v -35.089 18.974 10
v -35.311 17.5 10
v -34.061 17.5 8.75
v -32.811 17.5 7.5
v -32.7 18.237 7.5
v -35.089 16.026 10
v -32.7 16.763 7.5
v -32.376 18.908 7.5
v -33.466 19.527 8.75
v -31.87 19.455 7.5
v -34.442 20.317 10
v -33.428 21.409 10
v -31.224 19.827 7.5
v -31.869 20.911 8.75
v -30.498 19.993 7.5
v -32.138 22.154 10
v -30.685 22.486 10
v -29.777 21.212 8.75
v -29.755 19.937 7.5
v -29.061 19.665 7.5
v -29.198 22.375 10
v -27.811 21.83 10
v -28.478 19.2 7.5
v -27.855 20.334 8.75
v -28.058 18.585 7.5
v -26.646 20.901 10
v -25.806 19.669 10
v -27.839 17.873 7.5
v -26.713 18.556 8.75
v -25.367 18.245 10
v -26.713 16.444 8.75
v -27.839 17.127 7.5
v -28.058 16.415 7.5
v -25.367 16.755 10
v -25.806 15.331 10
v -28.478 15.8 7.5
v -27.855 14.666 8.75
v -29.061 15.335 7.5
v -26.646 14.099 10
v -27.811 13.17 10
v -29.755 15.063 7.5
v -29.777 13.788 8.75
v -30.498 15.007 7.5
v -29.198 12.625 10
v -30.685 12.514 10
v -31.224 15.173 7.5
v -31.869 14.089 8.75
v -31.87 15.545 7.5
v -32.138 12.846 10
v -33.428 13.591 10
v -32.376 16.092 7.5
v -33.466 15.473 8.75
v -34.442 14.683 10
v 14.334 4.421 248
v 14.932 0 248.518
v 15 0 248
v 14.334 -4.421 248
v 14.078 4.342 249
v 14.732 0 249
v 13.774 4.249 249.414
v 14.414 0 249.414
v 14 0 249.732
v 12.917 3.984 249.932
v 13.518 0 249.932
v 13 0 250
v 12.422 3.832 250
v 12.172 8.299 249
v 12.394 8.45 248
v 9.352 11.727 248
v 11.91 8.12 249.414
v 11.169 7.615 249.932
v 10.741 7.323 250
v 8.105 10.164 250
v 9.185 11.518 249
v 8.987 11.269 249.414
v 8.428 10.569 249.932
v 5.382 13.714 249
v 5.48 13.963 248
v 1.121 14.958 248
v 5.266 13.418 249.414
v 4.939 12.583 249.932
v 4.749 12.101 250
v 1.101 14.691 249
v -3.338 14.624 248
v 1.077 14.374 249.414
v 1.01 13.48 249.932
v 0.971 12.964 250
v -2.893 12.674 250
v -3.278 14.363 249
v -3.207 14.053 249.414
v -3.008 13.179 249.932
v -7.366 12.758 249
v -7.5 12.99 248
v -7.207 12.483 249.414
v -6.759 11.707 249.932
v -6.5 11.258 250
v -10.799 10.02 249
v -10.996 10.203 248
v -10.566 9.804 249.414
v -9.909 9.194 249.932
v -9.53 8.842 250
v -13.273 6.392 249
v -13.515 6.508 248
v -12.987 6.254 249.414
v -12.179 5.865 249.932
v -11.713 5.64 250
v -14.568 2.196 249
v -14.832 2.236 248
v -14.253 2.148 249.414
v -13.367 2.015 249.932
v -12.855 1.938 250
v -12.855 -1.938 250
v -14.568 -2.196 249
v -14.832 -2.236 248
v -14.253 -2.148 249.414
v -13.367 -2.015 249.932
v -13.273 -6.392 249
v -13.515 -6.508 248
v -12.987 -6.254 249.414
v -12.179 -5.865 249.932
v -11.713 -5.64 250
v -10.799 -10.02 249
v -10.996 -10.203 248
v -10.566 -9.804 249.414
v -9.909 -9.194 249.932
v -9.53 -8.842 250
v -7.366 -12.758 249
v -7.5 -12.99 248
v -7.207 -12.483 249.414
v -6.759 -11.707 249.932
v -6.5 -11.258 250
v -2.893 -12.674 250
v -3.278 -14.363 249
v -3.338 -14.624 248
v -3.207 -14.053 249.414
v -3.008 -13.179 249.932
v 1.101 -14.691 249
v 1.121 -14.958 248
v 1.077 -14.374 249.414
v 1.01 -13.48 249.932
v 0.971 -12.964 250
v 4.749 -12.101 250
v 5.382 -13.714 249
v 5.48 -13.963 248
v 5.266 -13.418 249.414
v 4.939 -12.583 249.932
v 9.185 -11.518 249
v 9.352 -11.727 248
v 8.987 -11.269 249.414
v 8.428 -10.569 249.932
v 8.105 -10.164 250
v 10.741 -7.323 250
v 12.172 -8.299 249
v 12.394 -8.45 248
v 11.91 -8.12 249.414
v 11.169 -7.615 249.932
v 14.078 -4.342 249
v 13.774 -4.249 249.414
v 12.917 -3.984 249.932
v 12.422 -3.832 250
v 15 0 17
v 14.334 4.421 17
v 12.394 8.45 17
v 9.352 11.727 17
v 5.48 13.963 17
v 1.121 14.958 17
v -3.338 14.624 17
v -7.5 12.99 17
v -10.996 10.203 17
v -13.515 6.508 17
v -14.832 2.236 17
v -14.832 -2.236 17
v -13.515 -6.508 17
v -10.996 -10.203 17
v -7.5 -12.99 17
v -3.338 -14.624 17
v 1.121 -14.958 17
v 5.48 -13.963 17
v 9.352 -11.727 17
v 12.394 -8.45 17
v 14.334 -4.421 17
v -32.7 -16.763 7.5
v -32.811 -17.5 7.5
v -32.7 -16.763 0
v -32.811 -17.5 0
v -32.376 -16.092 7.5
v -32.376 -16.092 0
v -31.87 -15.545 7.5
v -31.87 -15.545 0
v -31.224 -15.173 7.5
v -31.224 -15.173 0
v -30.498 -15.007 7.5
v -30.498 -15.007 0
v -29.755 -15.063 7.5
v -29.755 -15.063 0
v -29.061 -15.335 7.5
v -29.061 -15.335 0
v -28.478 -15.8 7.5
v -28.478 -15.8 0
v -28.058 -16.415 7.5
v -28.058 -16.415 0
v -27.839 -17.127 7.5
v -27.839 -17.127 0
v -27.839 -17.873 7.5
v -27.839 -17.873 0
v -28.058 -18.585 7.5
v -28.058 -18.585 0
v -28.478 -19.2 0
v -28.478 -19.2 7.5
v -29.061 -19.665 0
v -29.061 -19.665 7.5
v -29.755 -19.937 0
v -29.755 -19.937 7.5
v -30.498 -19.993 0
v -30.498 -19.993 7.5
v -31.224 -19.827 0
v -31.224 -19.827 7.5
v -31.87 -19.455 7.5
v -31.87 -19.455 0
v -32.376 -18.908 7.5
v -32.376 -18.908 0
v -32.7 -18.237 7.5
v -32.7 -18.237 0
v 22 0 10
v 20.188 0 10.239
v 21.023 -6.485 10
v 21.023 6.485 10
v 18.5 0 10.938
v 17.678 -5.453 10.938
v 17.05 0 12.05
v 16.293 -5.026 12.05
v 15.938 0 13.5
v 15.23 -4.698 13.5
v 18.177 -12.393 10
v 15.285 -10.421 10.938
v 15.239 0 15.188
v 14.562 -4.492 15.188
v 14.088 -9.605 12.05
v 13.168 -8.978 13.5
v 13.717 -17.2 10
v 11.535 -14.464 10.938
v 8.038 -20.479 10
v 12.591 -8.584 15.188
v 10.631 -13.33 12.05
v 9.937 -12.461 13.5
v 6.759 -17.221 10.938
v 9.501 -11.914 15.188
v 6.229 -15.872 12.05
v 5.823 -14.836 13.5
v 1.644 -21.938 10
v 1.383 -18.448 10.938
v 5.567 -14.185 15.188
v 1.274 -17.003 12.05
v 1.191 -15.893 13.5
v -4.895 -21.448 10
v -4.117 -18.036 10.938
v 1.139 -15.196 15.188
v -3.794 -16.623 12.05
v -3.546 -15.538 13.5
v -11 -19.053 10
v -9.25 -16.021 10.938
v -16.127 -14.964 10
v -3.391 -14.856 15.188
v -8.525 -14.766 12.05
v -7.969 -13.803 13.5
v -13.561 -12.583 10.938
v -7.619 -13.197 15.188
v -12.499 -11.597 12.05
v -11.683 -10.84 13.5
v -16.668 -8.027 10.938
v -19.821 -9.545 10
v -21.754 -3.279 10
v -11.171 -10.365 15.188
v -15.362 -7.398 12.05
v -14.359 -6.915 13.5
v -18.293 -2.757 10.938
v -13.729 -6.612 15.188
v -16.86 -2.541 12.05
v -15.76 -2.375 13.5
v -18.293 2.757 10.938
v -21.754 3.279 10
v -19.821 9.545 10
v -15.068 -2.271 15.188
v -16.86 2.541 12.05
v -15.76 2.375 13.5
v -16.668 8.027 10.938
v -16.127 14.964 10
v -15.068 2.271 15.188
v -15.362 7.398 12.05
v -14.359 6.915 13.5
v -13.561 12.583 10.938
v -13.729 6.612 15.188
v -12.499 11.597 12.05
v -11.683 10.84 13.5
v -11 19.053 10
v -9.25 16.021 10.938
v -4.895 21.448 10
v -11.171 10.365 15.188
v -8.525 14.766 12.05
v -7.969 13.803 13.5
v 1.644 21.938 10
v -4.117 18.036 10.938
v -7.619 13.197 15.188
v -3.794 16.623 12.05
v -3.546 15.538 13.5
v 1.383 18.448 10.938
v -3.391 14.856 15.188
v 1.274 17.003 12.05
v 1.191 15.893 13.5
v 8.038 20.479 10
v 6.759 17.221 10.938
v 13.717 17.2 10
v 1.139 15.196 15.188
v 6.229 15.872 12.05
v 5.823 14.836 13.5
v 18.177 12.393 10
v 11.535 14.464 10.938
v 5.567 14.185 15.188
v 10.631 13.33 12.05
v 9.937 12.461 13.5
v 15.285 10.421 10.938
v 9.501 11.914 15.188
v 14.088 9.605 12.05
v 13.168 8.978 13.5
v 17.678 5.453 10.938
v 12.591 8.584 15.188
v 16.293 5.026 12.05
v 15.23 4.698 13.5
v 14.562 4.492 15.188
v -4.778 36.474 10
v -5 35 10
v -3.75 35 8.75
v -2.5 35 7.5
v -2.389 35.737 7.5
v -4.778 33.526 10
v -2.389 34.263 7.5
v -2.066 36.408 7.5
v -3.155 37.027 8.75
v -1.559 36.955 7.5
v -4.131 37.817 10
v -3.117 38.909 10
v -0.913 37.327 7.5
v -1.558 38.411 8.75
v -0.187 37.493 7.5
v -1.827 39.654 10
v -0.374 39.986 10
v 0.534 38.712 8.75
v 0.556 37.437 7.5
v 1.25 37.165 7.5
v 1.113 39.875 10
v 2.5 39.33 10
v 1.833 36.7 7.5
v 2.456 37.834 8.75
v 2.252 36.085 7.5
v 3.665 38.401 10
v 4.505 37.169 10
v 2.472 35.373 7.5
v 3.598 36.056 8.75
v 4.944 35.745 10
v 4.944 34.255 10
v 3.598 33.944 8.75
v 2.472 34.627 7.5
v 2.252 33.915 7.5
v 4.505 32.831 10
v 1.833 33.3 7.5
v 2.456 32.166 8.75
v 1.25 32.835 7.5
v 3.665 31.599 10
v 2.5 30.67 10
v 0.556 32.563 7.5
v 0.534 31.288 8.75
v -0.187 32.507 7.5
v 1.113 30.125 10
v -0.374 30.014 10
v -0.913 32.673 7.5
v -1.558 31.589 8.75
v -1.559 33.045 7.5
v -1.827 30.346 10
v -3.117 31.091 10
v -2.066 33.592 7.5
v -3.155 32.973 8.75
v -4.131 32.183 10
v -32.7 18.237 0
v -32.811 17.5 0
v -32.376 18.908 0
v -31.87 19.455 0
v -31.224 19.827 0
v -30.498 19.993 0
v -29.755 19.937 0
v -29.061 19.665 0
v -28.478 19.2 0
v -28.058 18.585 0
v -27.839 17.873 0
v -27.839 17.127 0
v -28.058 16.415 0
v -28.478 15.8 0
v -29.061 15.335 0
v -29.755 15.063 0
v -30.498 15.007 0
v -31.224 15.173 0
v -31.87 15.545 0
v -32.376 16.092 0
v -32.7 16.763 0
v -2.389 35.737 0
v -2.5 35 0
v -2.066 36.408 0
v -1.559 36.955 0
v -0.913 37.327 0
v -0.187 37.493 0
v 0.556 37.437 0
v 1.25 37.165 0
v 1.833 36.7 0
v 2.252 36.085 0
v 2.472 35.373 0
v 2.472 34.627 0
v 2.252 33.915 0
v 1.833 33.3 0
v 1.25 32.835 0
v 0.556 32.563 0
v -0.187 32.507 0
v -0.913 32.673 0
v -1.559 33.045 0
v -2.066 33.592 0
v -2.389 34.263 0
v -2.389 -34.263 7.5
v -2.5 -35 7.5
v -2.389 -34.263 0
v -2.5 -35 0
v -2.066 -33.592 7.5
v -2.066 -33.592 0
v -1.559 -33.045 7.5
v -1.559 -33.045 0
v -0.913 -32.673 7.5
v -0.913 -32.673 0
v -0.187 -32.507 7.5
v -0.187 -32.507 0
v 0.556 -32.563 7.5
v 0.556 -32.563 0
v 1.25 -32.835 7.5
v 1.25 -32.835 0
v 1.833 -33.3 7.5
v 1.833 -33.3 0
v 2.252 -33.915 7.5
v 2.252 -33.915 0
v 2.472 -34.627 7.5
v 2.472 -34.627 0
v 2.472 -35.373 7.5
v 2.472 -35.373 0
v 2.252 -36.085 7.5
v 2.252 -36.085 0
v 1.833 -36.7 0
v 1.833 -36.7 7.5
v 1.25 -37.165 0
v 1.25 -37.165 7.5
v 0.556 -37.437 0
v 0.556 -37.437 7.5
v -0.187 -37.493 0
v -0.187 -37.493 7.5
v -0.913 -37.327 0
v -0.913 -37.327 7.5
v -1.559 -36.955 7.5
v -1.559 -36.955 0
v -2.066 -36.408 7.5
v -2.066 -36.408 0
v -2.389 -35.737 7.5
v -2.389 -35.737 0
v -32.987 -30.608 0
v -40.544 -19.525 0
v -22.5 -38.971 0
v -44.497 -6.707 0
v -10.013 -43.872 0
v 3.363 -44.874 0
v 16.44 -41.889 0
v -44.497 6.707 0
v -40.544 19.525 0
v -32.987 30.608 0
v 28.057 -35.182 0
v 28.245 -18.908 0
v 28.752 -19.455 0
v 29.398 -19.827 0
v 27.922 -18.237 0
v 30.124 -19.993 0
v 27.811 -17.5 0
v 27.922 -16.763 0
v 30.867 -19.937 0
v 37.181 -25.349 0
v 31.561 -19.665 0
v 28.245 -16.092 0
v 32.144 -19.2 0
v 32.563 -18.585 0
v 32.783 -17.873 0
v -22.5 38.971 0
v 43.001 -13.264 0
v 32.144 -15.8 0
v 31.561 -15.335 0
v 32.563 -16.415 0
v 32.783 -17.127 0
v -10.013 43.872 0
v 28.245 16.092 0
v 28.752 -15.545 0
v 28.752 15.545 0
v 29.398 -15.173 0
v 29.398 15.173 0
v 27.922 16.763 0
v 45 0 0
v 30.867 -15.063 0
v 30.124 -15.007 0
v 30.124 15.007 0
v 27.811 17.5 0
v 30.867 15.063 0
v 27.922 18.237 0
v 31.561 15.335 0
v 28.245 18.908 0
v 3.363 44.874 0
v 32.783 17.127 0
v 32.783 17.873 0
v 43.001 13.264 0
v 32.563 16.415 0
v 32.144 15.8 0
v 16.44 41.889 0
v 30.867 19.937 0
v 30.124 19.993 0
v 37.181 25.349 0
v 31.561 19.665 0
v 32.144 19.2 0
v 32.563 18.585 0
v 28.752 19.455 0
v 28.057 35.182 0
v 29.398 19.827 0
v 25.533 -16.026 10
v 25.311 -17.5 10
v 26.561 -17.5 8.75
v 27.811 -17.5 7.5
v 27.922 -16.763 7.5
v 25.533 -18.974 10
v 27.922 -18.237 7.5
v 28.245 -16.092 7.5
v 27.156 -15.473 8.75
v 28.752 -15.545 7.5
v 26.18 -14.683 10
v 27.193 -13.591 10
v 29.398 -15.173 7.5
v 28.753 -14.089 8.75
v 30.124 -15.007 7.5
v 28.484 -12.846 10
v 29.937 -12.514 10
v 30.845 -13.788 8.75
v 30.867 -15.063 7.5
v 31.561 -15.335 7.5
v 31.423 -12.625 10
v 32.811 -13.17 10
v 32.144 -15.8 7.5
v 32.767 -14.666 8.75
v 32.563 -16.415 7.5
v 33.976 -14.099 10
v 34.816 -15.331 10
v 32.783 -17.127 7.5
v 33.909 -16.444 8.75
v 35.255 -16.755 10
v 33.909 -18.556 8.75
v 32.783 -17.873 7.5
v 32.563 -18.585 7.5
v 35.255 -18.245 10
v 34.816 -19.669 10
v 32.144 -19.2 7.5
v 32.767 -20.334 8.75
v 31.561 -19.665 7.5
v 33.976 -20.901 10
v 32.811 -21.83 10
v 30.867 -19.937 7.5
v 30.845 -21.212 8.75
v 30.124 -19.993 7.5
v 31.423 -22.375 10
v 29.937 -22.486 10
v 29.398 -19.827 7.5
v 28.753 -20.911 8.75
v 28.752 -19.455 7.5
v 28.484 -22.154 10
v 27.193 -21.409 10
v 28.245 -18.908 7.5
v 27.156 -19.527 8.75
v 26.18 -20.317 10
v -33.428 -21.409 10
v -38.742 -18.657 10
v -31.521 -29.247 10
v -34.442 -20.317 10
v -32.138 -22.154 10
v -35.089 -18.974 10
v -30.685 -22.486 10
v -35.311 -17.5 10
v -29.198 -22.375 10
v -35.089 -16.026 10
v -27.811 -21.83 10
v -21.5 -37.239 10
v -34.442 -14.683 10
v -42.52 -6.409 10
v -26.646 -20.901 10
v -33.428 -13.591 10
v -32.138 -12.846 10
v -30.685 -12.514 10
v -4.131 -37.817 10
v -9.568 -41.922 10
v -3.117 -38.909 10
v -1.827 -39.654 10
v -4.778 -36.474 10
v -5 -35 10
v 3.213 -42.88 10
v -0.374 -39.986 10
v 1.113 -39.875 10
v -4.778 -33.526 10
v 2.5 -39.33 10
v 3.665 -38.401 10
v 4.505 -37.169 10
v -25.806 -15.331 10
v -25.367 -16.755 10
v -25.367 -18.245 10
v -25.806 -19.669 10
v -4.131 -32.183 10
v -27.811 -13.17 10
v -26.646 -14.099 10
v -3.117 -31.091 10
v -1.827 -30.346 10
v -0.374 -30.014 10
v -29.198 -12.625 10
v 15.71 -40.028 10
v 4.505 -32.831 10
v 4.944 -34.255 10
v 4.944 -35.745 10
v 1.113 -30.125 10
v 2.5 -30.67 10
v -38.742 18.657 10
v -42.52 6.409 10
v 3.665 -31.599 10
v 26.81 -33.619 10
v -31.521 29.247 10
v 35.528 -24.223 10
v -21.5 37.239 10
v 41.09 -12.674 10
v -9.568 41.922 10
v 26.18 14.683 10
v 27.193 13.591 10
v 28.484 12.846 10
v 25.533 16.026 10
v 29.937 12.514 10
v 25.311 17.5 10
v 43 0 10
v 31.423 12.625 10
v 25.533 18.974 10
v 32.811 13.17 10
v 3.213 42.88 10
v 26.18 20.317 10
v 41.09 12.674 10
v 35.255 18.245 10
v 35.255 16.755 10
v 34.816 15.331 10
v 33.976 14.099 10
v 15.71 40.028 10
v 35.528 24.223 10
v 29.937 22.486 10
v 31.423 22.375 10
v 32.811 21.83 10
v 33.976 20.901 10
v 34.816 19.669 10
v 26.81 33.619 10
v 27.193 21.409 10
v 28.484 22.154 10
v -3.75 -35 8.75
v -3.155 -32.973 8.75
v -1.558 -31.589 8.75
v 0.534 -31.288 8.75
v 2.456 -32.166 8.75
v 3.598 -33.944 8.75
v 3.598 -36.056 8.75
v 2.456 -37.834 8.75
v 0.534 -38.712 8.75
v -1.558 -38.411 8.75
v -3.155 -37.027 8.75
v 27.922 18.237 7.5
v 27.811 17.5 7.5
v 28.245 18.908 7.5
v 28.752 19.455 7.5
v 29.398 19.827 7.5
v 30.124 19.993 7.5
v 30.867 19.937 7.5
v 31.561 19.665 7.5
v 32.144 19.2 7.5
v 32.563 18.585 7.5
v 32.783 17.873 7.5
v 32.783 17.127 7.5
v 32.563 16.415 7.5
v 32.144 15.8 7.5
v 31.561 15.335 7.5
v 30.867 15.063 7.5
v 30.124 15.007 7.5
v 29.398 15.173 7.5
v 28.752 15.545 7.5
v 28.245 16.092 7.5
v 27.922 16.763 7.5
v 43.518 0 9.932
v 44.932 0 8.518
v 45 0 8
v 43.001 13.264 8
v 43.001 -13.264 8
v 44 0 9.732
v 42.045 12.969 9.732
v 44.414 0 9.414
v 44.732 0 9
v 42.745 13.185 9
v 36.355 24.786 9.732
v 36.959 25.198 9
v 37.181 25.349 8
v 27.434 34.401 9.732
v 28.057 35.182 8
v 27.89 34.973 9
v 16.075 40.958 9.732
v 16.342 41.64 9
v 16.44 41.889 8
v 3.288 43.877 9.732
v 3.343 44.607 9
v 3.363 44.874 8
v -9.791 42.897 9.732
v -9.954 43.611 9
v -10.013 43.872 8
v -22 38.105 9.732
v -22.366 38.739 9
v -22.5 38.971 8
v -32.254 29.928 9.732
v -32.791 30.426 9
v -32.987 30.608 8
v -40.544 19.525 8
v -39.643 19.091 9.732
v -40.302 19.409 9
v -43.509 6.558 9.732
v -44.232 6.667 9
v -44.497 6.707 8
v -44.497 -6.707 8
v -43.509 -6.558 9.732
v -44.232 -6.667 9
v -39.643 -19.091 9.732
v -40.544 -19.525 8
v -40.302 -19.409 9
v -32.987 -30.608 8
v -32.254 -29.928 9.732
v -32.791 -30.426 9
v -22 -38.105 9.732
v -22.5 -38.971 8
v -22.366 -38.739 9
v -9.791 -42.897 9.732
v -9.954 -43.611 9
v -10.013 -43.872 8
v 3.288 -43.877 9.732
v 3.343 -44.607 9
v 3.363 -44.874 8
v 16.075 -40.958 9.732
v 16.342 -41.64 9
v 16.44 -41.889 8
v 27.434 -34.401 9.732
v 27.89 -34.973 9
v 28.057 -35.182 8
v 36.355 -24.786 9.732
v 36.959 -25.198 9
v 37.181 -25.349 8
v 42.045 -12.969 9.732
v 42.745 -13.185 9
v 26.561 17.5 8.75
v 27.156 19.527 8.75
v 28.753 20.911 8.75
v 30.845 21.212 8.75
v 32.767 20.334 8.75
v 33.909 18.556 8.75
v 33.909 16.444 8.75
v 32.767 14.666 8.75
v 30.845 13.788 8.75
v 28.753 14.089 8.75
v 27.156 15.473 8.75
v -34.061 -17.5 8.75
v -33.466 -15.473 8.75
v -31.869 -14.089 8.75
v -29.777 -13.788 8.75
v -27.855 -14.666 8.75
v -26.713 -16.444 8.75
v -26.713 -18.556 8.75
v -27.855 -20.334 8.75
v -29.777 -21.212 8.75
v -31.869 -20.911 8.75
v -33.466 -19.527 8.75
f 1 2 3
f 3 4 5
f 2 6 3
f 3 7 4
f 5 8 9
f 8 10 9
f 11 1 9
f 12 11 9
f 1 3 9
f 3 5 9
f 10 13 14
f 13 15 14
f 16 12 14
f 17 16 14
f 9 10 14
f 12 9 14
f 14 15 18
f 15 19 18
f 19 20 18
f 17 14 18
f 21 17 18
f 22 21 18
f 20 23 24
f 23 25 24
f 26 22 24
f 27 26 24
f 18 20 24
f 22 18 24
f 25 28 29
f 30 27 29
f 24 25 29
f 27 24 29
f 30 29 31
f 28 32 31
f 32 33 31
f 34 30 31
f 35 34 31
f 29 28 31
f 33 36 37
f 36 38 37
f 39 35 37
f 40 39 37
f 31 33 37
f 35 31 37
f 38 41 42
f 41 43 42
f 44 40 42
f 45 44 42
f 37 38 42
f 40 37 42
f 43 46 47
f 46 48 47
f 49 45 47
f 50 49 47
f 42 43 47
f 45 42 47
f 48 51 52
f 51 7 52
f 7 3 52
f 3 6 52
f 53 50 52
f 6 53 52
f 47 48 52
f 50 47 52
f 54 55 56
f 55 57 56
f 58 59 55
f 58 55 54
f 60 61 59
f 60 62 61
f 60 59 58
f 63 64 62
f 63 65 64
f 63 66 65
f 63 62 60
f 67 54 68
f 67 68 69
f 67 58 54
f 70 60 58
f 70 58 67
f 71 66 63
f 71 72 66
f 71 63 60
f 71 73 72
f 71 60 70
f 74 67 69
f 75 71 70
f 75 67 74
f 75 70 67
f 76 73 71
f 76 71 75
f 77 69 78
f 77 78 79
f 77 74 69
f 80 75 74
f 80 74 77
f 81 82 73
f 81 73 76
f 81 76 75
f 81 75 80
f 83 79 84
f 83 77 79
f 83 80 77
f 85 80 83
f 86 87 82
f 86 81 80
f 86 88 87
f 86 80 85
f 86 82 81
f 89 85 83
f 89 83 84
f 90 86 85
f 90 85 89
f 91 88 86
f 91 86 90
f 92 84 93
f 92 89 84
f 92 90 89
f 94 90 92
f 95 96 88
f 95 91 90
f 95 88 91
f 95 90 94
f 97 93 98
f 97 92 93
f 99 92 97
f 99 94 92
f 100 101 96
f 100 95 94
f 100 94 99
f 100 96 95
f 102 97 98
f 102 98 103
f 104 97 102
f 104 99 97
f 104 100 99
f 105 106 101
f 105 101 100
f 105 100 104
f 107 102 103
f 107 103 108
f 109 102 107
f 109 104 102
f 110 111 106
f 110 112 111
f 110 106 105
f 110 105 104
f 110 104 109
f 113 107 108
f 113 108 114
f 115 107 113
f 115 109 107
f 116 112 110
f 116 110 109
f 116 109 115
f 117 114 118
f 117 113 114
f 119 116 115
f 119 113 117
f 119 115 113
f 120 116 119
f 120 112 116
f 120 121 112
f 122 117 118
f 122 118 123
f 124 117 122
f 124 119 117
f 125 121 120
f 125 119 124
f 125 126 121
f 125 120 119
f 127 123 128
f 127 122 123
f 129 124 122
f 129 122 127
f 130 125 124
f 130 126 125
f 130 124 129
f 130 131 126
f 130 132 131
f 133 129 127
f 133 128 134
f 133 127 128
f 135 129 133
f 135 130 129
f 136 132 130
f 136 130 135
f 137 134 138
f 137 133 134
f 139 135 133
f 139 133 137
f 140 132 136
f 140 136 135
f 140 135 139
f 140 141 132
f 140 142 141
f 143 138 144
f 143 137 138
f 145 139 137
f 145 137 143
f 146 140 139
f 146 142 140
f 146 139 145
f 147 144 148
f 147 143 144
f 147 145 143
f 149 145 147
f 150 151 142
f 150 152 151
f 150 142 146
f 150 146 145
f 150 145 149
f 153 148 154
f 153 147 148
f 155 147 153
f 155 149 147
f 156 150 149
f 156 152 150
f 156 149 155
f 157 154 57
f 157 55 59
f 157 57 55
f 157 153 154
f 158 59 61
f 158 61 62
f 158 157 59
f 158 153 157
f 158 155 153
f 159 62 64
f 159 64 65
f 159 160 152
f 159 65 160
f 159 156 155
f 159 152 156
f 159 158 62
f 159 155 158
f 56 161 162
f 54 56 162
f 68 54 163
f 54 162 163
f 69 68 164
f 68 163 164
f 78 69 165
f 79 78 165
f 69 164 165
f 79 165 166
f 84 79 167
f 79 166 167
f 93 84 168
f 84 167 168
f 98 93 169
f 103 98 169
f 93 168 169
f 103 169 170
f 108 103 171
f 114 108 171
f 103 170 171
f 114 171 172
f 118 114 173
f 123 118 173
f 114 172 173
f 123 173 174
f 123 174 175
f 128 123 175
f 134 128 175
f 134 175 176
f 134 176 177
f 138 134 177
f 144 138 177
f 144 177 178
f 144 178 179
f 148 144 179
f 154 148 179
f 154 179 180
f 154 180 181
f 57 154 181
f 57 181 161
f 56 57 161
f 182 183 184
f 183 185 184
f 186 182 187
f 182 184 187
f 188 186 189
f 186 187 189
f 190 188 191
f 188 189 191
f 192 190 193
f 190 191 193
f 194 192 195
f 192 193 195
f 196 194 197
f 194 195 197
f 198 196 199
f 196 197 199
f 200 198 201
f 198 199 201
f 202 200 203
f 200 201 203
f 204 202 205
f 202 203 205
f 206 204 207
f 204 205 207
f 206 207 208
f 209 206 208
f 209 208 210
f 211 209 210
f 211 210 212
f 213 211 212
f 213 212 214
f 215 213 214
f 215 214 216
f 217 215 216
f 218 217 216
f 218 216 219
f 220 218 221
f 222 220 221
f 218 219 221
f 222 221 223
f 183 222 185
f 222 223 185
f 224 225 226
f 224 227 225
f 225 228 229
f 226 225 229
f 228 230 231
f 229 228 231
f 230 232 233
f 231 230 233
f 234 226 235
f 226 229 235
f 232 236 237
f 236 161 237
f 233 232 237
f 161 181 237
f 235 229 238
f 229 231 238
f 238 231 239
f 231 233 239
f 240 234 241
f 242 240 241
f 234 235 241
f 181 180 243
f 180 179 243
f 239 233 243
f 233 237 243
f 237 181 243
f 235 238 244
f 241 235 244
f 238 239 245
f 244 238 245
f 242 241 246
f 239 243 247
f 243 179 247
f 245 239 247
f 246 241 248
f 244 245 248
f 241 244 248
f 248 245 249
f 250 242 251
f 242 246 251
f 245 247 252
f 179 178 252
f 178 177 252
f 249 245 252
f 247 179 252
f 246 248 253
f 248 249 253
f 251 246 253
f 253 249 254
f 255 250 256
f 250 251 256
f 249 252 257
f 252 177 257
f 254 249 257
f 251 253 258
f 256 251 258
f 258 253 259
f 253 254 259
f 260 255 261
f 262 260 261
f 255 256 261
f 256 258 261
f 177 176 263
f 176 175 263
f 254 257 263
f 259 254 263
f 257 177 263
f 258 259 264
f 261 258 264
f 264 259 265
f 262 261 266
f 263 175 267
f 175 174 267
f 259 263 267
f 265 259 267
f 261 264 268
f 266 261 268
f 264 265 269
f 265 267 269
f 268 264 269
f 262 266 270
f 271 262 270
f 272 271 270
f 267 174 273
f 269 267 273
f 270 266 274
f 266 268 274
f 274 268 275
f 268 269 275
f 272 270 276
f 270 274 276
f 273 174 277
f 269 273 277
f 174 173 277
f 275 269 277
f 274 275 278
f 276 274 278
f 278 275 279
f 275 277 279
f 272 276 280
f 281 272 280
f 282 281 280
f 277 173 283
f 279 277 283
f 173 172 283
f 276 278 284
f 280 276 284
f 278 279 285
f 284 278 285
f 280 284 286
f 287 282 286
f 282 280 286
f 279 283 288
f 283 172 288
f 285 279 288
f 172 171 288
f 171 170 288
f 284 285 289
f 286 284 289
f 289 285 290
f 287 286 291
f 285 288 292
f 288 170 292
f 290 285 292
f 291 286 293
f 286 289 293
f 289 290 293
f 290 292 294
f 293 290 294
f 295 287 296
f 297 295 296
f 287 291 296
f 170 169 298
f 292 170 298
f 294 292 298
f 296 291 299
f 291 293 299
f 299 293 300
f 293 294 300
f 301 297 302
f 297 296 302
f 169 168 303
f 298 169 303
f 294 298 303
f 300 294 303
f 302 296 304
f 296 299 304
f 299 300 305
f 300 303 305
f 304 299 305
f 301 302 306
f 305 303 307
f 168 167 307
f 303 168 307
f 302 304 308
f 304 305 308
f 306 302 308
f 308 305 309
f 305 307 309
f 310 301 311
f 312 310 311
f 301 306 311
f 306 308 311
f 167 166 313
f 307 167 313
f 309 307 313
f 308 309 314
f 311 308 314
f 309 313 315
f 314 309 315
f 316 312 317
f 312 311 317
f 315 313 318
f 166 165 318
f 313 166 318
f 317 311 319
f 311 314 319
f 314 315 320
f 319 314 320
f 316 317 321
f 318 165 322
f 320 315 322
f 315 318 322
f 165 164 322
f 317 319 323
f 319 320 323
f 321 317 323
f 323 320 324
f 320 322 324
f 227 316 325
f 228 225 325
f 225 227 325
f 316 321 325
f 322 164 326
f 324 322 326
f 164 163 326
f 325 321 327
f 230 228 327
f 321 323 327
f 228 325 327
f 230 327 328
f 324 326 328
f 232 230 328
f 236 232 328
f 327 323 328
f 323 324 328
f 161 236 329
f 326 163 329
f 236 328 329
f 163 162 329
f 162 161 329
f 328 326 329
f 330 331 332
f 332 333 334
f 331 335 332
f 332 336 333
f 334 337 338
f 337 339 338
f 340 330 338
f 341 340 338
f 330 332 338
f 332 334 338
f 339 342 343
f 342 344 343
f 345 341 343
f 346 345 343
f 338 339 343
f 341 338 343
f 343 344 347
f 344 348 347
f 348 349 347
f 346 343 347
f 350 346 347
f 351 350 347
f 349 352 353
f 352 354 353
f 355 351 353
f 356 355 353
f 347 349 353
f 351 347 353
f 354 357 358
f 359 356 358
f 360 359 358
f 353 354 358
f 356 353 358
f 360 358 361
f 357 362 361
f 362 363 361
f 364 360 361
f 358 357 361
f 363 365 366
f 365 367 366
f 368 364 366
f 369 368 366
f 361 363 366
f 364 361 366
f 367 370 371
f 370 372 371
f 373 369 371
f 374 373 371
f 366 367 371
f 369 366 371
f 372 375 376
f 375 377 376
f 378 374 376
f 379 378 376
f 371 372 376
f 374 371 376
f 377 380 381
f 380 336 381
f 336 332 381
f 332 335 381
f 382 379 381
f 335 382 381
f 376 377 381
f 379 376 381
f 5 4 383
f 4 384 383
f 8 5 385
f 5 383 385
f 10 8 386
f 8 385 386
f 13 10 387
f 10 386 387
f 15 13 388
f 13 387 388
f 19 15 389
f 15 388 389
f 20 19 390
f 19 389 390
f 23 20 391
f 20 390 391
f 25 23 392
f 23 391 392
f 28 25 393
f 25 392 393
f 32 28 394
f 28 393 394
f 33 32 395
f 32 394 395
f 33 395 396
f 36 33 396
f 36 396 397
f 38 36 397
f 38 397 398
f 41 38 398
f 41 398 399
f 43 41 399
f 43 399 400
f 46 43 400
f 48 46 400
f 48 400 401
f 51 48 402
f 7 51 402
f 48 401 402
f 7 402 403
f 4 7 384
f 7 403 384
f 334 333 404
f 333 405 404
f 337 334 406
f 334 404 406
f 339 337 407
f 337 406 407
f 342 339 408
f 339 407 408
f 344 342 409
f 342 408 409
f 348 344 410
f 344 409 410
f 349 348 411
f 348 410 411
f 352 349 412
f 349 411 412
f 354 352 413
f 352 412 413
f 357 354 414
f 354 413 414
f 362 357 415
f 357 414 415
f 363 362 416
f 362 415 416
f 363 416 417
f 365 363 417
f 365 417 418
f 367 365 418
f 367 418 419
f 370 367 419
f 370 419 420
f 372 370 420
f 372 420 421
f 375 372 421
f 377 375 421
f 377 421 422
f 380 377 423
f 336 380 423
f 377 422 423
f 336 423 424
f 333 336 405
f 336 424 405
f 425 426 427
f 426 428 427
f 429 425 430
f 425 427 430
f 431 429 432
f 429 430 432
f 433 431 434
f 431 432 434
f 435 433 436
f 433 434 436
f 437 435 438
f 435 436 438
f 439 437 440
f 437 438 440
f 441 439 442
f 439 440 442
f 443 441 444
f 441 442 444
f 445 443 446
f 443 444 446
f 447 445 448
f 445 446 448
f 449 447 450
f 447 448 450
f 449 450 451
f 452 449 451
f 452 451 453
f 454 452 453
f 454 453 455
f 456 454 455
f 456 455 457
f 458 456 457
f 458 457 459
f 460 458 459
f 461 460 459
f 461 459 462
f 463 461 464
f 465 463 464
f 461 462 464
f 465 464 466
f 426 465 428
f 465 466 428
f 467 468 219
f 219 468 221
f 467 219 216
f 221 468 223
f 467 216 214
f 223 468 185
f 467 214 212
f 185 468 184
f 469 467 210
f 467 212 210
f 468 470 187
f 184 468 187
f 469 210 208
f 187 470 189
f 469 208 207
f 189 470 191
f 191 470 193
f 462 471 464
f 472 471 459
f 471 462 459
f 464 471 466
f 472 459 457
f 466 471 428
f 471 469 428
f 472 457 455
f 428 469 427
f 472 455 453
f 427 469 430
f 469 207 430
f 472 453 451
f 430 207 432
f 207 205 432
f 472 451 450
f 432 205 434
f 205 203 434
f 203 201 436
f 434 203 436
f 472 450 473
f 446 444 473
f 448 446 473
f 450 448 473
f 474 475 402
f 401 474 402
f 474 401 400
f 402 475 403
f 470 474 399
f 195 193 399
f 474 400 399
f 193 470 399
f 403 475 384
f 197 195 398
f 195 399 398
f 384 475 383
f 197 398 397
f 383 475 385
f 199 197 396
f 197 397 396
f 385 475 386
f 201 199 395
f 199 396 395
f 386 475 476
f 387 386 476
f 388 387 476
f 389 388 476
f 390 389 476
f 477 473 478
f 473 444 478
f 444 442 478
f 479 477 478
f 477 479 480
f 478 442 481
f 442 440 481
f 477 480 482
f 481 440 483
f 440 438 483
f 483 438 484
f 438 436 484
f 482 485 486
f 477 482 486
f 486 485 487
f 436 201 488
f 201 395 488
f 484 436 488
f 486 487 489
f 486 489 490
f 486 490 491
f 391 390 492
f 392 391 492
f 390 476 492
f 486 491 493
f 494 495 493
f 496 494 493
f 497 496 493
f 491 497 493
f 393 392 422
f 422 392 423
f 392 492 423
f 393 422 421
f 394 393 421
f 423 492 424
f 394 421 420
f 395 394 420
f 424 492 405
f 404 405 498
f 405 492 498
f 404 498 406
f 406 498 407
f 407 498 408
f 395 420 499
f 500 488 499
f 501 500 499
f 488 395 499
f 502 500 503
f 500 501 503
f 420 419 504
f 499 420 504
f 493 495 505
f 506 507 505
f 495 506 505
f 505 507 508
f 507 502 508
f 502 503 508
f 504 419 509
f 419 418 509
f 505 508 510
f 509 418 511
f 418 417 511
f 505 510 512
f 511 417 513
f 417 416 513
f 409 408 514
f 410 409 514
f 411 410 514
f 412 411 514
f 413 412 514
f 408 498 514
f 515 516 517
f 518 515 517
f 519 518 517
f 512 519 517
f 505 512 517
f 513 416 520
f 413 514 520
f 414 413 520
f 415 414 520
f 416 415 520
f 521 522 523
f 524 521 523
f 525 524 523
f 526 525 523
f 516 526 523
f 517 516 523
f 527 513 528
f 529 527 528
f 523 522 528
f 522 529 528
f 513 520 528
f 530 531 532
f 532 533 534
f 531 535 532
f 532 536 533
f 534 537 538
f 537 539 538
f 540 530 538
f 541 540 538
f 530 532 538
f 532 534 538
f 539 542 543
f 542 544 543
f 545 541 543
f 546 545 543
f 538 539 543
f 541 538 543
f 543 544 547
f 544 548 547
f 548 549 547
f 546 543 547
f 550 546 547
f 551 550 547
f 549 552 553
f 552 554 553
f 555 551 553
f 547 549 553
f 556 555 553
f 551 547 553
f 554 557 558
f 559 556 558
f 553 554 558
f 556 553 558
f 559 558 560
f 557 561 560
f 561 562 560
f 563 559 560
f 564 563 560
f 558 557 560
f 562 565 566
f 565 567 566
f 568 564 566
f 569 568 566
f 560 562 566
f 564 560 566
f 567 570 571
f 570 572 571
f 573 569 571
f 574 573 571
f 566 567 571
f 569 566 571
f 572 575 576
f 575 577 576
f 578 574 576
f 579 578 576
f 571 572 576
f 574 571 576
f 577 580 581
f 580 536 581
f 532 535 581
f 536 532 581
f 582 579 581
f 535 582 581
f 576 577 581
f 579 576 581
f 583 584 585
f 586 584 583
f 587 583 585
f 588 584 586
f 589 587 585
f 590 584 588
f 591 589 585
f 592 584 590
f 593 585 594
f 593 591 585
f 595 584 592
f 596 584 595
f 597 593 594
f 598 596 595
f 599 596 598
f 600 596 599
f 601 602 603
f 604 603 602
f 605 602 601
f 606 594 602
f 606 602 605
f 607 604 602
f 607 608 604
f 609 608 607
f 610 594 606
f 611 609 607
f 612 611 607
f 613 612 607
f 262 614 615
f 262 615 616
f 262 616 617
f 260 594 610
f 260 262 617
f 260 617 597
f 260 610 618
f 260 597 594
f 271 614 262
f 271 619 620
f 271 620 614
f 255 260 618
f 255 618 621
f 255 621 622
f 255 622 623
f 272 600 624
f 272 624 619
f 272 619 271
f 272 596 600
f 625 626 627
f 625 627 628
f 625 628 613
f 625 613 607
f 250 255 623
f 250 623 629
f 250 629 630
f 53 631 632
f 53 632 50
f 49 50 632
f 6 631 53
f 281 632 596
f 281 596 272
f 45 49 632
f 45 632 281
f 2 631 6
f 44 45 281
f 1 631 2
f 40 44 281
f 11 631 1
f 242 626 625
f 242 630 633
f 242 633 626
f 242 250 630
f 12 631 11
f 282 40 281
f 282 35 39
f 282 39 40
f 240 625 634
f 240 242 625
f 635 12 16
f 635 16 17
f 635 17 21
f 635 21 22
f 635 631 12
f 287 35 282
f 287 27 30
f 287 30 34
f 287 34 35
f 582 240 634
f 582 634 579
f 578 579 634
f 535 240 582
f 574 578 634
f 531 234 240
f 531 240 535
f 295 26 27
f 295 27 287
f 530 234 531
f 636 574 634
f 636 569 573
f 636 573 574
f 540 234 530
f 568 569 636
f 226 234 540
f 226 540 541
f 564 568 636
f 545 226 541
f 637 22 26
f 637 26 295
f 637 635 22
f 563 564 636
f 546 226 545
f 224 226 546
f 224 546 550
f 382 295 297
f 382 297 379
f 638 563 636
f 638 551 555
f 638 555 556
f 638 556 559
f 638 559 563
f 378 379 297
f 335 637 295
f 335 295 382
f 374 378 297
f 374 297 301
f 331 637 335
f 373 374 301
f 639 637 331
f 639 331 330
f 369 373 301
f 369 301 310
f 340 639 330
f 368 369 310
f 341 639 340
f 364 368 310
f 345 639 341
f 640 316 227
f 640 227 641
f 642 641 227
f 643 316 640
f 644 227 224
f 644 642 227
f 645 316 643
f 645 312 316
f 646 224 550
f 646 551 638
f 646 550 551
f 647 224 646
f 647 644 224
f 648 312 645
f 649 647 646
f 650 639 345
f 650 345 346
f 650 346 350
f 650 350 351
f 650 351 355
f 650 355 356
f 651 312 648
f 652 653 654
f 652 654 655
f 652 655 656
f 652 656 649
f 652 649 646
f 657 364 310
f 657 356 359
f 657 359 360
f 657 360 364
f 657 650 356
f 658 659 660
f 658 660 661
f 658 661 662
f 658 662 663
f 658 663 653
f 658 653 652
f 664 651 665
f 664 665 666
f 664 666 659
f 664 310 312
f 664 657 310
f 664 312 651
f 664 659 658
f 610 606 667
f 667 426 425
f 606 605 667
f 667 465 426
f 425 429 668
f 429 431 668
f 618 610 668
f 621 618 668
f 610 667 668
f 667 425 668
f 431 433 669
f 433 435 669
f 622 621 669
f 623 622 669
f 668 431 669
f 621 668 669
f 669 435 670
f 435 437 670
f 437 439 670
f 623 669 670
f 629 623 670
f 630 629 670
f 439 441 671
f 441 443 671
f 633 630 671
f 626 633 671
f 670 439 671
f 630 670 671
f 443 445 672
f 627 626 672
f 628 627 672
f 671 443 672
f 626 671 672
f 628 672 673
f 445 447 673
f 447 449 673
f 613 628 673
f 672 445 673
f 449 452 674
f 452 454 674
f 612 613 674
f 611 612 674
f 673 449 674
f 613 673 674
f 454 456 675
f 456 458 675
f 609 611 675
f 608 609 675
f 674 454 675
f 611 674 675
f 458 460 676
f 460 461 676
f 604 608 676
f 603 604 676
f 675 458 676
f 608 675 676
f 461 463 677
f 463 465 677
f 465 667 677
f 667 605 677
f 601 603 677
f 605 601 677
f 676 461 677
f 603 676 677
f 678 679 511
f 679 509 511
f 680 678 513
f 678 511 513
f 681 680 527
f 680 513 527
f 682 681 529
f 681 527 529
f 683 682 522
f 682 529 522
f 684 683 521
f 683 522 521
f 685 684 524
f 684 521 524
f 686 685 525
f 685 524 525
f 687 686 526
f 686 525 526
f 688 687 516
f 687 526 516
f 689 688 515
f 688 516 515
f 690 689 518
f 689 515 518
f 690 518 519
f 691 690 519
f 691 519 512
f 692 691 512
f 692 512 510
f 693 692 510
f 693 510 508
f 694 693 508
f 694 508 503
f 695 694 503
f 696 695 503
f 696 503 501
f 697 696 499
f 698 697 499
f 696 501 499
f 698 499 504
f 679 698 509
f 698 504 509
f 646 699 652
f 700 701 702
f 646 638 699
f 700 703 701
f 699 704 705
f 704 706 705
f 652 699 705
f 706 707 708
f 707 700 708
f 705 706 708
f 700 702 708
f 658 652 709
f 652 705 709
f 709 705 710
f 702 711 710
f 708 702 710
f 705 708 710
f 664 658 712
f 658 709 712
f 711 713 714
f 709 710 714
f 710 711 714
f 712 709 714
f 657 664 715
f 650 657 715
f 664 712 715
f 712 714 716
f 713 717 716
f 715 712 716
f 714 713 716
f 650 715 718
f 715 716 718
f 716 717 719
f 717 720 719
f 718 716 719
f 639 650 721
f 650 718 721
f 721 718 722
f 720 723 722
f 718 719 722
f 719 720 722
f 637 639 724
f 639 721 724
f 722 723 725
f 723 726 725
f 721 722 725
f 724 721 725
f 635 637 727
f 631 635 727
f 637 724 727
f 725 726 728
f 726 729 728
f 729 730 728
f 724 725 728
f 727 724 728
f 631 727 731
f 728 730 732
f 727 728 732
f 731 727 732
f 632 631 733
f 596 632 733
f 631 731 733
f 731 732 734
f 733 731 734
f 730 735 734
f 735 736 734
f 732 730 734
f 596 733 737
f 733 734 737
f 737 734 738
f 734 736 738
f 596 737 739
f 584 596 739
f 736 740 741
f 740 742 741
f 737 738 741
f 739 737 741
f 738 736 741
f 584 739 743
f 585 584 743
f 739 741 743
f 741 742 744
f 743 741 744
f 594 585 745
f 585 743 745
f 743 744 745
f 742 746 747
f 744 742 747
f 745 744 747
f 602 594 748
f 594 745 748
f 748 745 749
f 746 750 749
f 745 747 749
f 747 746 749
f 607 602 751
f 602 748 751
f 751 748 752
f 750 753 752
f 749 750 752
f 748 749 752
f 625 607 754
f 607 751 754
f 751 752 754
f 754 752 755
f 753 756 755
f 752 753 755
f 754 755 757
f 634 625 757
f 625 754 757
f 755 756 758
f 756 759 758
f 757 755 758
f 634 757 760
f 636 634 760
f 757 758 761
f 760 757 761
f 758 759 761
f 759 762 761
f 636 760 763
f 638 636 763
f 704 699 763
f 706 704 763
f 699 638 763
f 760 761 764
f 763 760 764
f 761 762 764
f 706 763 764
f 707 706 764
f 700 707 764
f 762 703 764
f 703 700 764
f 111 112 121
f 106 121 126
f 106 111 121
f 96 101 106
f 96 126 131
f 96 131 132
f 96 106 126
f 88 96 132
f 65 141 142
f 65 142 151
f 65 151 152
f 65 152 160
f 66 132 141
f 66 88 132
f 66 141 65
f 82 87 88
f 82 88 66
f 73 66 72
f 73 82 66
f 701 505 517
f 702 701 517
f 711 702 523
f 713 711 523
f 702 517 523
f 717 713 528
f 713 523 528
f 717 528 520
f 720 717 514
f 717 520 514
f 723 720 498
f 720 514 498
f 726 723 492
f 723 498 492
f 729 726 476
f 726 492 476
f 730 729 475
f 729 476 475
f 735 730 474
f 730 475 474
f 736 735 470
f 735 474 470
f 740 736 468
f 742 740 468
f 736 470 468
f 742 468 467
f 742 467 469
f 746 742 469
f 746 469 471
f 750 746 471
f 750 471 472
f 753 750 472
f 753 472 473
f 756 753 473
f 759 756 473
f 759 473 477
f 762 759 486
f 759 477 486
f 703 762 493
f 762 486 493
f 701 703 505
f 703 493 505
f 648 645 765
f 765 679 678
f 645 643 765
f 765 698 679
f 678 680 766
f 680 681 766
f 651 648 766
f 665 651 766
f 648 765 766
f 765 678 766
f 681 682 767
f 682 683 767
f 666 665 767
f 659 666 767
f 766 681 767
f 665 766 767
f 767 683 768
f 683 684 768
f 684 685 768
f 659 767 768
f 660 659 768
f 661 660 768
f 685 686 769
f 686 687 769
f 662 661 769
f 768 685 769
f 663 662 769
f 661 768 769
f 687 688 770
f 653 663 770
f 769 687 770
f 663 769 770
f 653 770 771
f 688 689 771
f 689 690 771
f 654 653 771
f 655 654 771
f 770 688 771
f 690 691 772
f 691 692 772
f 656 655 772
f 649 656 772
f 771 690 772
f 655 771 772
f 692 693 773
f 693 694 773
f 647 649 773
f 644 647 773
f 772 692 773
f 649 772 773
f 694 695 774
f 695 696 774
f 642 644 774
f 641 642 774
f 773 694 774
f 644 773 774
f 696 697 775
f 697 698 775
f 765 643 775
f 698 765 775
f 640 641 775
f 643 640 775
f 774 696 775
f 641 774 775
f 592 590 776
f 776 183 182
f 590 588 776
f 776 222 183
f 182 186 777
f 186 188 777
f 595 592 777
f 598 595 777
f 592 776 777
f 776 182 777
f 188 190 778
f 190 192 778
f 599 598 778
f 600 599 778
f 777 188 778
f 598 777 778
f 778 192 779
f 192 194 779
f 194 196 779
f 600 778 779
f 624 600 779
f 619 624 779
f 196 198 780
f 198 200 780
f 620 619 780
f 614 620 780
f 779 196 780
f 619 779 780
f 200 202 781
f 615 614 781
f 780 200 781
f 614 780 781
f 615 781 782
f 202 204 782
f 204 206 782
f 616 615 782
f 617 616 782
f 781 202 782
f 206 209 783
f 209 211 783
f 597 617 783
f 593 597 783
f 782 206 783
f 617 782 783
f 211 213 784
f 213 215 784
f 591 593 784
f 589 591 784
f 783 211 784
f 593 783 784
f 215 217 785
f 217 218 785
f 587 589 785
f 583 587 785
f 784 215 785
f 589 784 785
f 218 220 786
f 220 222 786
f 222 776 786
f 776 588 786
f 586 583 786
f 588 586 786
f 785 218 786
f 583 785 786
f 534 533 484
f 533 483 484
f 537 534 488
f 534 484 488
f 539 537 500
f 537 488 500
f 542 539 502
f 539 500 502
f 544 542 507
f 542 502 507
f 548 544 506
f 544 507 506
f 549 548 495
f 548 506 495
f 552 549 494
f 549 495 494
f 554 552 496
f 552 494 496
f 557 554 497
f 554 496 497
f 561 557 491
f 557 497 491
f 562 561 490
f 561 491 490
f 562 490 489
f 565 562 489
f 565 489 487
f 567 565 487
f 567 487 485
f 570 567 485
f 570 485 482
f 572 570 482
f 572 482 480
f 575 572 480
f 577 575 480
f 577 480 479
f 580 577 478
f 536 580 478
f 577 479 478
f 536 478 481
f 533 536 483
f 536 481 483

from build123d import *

# Parameters (mm, degrees)
F0_R           = 45
F1_DEPTH       = 10
F2_R           = 15
F3_DEPTH       = 250
F5_D           = 5
F5_CSINK_D     = 10
F5_CSINK_ANGLE = 90
F6_R           = 7
F7_R           = 2
F8_R           = 2


with BuildPart() as f1:
    # F0 (on Top) → F1 (new body)
    with BuildSketch(Plane.XY):
        Circle(F0_R)
    extrude(amount=F1_DEPTH)

    # F2 (on Top) → F3 (join)
    with BuildSketch(Plane.XY):
        Circle(F2_R)
    extrude(amount=F3_DEPTH)

    # F5 (through all)
    with Locations(Plane.XY.offset(10)):
        with Locations((0, 35), (-30.310889, 17.5), (-30.310889, -17.5), (0, -35), (30.310889, -17.5), (30.310889, 17.5)):
            CounterSinkHole(F5_D / 2, F5_CSINK_D / 2, counter_sink_angle=F5_CSINK_ANGLE)

    # F6
    f6_edges = [f1.edges().sort_by_distance(p)[0] for p in [
        (-15, 0, 10),
    ]]
    fillet(f6_edges, radius=F6_R)

    # F7
    f7_edges = [f1.edges().sort_by_distance(p)[0] for p in [
        (-15, 0, 250),
    ]]
    fillet(f7_edges, radius=F7_R)

    # F8
    f8_edges = [f1.edges().sort_by_distance(p)[0] for p in [
        (-45, 0, 10),
    ]]
    fillet(f8_edges, radius=F8_R)


solid = f1.part
